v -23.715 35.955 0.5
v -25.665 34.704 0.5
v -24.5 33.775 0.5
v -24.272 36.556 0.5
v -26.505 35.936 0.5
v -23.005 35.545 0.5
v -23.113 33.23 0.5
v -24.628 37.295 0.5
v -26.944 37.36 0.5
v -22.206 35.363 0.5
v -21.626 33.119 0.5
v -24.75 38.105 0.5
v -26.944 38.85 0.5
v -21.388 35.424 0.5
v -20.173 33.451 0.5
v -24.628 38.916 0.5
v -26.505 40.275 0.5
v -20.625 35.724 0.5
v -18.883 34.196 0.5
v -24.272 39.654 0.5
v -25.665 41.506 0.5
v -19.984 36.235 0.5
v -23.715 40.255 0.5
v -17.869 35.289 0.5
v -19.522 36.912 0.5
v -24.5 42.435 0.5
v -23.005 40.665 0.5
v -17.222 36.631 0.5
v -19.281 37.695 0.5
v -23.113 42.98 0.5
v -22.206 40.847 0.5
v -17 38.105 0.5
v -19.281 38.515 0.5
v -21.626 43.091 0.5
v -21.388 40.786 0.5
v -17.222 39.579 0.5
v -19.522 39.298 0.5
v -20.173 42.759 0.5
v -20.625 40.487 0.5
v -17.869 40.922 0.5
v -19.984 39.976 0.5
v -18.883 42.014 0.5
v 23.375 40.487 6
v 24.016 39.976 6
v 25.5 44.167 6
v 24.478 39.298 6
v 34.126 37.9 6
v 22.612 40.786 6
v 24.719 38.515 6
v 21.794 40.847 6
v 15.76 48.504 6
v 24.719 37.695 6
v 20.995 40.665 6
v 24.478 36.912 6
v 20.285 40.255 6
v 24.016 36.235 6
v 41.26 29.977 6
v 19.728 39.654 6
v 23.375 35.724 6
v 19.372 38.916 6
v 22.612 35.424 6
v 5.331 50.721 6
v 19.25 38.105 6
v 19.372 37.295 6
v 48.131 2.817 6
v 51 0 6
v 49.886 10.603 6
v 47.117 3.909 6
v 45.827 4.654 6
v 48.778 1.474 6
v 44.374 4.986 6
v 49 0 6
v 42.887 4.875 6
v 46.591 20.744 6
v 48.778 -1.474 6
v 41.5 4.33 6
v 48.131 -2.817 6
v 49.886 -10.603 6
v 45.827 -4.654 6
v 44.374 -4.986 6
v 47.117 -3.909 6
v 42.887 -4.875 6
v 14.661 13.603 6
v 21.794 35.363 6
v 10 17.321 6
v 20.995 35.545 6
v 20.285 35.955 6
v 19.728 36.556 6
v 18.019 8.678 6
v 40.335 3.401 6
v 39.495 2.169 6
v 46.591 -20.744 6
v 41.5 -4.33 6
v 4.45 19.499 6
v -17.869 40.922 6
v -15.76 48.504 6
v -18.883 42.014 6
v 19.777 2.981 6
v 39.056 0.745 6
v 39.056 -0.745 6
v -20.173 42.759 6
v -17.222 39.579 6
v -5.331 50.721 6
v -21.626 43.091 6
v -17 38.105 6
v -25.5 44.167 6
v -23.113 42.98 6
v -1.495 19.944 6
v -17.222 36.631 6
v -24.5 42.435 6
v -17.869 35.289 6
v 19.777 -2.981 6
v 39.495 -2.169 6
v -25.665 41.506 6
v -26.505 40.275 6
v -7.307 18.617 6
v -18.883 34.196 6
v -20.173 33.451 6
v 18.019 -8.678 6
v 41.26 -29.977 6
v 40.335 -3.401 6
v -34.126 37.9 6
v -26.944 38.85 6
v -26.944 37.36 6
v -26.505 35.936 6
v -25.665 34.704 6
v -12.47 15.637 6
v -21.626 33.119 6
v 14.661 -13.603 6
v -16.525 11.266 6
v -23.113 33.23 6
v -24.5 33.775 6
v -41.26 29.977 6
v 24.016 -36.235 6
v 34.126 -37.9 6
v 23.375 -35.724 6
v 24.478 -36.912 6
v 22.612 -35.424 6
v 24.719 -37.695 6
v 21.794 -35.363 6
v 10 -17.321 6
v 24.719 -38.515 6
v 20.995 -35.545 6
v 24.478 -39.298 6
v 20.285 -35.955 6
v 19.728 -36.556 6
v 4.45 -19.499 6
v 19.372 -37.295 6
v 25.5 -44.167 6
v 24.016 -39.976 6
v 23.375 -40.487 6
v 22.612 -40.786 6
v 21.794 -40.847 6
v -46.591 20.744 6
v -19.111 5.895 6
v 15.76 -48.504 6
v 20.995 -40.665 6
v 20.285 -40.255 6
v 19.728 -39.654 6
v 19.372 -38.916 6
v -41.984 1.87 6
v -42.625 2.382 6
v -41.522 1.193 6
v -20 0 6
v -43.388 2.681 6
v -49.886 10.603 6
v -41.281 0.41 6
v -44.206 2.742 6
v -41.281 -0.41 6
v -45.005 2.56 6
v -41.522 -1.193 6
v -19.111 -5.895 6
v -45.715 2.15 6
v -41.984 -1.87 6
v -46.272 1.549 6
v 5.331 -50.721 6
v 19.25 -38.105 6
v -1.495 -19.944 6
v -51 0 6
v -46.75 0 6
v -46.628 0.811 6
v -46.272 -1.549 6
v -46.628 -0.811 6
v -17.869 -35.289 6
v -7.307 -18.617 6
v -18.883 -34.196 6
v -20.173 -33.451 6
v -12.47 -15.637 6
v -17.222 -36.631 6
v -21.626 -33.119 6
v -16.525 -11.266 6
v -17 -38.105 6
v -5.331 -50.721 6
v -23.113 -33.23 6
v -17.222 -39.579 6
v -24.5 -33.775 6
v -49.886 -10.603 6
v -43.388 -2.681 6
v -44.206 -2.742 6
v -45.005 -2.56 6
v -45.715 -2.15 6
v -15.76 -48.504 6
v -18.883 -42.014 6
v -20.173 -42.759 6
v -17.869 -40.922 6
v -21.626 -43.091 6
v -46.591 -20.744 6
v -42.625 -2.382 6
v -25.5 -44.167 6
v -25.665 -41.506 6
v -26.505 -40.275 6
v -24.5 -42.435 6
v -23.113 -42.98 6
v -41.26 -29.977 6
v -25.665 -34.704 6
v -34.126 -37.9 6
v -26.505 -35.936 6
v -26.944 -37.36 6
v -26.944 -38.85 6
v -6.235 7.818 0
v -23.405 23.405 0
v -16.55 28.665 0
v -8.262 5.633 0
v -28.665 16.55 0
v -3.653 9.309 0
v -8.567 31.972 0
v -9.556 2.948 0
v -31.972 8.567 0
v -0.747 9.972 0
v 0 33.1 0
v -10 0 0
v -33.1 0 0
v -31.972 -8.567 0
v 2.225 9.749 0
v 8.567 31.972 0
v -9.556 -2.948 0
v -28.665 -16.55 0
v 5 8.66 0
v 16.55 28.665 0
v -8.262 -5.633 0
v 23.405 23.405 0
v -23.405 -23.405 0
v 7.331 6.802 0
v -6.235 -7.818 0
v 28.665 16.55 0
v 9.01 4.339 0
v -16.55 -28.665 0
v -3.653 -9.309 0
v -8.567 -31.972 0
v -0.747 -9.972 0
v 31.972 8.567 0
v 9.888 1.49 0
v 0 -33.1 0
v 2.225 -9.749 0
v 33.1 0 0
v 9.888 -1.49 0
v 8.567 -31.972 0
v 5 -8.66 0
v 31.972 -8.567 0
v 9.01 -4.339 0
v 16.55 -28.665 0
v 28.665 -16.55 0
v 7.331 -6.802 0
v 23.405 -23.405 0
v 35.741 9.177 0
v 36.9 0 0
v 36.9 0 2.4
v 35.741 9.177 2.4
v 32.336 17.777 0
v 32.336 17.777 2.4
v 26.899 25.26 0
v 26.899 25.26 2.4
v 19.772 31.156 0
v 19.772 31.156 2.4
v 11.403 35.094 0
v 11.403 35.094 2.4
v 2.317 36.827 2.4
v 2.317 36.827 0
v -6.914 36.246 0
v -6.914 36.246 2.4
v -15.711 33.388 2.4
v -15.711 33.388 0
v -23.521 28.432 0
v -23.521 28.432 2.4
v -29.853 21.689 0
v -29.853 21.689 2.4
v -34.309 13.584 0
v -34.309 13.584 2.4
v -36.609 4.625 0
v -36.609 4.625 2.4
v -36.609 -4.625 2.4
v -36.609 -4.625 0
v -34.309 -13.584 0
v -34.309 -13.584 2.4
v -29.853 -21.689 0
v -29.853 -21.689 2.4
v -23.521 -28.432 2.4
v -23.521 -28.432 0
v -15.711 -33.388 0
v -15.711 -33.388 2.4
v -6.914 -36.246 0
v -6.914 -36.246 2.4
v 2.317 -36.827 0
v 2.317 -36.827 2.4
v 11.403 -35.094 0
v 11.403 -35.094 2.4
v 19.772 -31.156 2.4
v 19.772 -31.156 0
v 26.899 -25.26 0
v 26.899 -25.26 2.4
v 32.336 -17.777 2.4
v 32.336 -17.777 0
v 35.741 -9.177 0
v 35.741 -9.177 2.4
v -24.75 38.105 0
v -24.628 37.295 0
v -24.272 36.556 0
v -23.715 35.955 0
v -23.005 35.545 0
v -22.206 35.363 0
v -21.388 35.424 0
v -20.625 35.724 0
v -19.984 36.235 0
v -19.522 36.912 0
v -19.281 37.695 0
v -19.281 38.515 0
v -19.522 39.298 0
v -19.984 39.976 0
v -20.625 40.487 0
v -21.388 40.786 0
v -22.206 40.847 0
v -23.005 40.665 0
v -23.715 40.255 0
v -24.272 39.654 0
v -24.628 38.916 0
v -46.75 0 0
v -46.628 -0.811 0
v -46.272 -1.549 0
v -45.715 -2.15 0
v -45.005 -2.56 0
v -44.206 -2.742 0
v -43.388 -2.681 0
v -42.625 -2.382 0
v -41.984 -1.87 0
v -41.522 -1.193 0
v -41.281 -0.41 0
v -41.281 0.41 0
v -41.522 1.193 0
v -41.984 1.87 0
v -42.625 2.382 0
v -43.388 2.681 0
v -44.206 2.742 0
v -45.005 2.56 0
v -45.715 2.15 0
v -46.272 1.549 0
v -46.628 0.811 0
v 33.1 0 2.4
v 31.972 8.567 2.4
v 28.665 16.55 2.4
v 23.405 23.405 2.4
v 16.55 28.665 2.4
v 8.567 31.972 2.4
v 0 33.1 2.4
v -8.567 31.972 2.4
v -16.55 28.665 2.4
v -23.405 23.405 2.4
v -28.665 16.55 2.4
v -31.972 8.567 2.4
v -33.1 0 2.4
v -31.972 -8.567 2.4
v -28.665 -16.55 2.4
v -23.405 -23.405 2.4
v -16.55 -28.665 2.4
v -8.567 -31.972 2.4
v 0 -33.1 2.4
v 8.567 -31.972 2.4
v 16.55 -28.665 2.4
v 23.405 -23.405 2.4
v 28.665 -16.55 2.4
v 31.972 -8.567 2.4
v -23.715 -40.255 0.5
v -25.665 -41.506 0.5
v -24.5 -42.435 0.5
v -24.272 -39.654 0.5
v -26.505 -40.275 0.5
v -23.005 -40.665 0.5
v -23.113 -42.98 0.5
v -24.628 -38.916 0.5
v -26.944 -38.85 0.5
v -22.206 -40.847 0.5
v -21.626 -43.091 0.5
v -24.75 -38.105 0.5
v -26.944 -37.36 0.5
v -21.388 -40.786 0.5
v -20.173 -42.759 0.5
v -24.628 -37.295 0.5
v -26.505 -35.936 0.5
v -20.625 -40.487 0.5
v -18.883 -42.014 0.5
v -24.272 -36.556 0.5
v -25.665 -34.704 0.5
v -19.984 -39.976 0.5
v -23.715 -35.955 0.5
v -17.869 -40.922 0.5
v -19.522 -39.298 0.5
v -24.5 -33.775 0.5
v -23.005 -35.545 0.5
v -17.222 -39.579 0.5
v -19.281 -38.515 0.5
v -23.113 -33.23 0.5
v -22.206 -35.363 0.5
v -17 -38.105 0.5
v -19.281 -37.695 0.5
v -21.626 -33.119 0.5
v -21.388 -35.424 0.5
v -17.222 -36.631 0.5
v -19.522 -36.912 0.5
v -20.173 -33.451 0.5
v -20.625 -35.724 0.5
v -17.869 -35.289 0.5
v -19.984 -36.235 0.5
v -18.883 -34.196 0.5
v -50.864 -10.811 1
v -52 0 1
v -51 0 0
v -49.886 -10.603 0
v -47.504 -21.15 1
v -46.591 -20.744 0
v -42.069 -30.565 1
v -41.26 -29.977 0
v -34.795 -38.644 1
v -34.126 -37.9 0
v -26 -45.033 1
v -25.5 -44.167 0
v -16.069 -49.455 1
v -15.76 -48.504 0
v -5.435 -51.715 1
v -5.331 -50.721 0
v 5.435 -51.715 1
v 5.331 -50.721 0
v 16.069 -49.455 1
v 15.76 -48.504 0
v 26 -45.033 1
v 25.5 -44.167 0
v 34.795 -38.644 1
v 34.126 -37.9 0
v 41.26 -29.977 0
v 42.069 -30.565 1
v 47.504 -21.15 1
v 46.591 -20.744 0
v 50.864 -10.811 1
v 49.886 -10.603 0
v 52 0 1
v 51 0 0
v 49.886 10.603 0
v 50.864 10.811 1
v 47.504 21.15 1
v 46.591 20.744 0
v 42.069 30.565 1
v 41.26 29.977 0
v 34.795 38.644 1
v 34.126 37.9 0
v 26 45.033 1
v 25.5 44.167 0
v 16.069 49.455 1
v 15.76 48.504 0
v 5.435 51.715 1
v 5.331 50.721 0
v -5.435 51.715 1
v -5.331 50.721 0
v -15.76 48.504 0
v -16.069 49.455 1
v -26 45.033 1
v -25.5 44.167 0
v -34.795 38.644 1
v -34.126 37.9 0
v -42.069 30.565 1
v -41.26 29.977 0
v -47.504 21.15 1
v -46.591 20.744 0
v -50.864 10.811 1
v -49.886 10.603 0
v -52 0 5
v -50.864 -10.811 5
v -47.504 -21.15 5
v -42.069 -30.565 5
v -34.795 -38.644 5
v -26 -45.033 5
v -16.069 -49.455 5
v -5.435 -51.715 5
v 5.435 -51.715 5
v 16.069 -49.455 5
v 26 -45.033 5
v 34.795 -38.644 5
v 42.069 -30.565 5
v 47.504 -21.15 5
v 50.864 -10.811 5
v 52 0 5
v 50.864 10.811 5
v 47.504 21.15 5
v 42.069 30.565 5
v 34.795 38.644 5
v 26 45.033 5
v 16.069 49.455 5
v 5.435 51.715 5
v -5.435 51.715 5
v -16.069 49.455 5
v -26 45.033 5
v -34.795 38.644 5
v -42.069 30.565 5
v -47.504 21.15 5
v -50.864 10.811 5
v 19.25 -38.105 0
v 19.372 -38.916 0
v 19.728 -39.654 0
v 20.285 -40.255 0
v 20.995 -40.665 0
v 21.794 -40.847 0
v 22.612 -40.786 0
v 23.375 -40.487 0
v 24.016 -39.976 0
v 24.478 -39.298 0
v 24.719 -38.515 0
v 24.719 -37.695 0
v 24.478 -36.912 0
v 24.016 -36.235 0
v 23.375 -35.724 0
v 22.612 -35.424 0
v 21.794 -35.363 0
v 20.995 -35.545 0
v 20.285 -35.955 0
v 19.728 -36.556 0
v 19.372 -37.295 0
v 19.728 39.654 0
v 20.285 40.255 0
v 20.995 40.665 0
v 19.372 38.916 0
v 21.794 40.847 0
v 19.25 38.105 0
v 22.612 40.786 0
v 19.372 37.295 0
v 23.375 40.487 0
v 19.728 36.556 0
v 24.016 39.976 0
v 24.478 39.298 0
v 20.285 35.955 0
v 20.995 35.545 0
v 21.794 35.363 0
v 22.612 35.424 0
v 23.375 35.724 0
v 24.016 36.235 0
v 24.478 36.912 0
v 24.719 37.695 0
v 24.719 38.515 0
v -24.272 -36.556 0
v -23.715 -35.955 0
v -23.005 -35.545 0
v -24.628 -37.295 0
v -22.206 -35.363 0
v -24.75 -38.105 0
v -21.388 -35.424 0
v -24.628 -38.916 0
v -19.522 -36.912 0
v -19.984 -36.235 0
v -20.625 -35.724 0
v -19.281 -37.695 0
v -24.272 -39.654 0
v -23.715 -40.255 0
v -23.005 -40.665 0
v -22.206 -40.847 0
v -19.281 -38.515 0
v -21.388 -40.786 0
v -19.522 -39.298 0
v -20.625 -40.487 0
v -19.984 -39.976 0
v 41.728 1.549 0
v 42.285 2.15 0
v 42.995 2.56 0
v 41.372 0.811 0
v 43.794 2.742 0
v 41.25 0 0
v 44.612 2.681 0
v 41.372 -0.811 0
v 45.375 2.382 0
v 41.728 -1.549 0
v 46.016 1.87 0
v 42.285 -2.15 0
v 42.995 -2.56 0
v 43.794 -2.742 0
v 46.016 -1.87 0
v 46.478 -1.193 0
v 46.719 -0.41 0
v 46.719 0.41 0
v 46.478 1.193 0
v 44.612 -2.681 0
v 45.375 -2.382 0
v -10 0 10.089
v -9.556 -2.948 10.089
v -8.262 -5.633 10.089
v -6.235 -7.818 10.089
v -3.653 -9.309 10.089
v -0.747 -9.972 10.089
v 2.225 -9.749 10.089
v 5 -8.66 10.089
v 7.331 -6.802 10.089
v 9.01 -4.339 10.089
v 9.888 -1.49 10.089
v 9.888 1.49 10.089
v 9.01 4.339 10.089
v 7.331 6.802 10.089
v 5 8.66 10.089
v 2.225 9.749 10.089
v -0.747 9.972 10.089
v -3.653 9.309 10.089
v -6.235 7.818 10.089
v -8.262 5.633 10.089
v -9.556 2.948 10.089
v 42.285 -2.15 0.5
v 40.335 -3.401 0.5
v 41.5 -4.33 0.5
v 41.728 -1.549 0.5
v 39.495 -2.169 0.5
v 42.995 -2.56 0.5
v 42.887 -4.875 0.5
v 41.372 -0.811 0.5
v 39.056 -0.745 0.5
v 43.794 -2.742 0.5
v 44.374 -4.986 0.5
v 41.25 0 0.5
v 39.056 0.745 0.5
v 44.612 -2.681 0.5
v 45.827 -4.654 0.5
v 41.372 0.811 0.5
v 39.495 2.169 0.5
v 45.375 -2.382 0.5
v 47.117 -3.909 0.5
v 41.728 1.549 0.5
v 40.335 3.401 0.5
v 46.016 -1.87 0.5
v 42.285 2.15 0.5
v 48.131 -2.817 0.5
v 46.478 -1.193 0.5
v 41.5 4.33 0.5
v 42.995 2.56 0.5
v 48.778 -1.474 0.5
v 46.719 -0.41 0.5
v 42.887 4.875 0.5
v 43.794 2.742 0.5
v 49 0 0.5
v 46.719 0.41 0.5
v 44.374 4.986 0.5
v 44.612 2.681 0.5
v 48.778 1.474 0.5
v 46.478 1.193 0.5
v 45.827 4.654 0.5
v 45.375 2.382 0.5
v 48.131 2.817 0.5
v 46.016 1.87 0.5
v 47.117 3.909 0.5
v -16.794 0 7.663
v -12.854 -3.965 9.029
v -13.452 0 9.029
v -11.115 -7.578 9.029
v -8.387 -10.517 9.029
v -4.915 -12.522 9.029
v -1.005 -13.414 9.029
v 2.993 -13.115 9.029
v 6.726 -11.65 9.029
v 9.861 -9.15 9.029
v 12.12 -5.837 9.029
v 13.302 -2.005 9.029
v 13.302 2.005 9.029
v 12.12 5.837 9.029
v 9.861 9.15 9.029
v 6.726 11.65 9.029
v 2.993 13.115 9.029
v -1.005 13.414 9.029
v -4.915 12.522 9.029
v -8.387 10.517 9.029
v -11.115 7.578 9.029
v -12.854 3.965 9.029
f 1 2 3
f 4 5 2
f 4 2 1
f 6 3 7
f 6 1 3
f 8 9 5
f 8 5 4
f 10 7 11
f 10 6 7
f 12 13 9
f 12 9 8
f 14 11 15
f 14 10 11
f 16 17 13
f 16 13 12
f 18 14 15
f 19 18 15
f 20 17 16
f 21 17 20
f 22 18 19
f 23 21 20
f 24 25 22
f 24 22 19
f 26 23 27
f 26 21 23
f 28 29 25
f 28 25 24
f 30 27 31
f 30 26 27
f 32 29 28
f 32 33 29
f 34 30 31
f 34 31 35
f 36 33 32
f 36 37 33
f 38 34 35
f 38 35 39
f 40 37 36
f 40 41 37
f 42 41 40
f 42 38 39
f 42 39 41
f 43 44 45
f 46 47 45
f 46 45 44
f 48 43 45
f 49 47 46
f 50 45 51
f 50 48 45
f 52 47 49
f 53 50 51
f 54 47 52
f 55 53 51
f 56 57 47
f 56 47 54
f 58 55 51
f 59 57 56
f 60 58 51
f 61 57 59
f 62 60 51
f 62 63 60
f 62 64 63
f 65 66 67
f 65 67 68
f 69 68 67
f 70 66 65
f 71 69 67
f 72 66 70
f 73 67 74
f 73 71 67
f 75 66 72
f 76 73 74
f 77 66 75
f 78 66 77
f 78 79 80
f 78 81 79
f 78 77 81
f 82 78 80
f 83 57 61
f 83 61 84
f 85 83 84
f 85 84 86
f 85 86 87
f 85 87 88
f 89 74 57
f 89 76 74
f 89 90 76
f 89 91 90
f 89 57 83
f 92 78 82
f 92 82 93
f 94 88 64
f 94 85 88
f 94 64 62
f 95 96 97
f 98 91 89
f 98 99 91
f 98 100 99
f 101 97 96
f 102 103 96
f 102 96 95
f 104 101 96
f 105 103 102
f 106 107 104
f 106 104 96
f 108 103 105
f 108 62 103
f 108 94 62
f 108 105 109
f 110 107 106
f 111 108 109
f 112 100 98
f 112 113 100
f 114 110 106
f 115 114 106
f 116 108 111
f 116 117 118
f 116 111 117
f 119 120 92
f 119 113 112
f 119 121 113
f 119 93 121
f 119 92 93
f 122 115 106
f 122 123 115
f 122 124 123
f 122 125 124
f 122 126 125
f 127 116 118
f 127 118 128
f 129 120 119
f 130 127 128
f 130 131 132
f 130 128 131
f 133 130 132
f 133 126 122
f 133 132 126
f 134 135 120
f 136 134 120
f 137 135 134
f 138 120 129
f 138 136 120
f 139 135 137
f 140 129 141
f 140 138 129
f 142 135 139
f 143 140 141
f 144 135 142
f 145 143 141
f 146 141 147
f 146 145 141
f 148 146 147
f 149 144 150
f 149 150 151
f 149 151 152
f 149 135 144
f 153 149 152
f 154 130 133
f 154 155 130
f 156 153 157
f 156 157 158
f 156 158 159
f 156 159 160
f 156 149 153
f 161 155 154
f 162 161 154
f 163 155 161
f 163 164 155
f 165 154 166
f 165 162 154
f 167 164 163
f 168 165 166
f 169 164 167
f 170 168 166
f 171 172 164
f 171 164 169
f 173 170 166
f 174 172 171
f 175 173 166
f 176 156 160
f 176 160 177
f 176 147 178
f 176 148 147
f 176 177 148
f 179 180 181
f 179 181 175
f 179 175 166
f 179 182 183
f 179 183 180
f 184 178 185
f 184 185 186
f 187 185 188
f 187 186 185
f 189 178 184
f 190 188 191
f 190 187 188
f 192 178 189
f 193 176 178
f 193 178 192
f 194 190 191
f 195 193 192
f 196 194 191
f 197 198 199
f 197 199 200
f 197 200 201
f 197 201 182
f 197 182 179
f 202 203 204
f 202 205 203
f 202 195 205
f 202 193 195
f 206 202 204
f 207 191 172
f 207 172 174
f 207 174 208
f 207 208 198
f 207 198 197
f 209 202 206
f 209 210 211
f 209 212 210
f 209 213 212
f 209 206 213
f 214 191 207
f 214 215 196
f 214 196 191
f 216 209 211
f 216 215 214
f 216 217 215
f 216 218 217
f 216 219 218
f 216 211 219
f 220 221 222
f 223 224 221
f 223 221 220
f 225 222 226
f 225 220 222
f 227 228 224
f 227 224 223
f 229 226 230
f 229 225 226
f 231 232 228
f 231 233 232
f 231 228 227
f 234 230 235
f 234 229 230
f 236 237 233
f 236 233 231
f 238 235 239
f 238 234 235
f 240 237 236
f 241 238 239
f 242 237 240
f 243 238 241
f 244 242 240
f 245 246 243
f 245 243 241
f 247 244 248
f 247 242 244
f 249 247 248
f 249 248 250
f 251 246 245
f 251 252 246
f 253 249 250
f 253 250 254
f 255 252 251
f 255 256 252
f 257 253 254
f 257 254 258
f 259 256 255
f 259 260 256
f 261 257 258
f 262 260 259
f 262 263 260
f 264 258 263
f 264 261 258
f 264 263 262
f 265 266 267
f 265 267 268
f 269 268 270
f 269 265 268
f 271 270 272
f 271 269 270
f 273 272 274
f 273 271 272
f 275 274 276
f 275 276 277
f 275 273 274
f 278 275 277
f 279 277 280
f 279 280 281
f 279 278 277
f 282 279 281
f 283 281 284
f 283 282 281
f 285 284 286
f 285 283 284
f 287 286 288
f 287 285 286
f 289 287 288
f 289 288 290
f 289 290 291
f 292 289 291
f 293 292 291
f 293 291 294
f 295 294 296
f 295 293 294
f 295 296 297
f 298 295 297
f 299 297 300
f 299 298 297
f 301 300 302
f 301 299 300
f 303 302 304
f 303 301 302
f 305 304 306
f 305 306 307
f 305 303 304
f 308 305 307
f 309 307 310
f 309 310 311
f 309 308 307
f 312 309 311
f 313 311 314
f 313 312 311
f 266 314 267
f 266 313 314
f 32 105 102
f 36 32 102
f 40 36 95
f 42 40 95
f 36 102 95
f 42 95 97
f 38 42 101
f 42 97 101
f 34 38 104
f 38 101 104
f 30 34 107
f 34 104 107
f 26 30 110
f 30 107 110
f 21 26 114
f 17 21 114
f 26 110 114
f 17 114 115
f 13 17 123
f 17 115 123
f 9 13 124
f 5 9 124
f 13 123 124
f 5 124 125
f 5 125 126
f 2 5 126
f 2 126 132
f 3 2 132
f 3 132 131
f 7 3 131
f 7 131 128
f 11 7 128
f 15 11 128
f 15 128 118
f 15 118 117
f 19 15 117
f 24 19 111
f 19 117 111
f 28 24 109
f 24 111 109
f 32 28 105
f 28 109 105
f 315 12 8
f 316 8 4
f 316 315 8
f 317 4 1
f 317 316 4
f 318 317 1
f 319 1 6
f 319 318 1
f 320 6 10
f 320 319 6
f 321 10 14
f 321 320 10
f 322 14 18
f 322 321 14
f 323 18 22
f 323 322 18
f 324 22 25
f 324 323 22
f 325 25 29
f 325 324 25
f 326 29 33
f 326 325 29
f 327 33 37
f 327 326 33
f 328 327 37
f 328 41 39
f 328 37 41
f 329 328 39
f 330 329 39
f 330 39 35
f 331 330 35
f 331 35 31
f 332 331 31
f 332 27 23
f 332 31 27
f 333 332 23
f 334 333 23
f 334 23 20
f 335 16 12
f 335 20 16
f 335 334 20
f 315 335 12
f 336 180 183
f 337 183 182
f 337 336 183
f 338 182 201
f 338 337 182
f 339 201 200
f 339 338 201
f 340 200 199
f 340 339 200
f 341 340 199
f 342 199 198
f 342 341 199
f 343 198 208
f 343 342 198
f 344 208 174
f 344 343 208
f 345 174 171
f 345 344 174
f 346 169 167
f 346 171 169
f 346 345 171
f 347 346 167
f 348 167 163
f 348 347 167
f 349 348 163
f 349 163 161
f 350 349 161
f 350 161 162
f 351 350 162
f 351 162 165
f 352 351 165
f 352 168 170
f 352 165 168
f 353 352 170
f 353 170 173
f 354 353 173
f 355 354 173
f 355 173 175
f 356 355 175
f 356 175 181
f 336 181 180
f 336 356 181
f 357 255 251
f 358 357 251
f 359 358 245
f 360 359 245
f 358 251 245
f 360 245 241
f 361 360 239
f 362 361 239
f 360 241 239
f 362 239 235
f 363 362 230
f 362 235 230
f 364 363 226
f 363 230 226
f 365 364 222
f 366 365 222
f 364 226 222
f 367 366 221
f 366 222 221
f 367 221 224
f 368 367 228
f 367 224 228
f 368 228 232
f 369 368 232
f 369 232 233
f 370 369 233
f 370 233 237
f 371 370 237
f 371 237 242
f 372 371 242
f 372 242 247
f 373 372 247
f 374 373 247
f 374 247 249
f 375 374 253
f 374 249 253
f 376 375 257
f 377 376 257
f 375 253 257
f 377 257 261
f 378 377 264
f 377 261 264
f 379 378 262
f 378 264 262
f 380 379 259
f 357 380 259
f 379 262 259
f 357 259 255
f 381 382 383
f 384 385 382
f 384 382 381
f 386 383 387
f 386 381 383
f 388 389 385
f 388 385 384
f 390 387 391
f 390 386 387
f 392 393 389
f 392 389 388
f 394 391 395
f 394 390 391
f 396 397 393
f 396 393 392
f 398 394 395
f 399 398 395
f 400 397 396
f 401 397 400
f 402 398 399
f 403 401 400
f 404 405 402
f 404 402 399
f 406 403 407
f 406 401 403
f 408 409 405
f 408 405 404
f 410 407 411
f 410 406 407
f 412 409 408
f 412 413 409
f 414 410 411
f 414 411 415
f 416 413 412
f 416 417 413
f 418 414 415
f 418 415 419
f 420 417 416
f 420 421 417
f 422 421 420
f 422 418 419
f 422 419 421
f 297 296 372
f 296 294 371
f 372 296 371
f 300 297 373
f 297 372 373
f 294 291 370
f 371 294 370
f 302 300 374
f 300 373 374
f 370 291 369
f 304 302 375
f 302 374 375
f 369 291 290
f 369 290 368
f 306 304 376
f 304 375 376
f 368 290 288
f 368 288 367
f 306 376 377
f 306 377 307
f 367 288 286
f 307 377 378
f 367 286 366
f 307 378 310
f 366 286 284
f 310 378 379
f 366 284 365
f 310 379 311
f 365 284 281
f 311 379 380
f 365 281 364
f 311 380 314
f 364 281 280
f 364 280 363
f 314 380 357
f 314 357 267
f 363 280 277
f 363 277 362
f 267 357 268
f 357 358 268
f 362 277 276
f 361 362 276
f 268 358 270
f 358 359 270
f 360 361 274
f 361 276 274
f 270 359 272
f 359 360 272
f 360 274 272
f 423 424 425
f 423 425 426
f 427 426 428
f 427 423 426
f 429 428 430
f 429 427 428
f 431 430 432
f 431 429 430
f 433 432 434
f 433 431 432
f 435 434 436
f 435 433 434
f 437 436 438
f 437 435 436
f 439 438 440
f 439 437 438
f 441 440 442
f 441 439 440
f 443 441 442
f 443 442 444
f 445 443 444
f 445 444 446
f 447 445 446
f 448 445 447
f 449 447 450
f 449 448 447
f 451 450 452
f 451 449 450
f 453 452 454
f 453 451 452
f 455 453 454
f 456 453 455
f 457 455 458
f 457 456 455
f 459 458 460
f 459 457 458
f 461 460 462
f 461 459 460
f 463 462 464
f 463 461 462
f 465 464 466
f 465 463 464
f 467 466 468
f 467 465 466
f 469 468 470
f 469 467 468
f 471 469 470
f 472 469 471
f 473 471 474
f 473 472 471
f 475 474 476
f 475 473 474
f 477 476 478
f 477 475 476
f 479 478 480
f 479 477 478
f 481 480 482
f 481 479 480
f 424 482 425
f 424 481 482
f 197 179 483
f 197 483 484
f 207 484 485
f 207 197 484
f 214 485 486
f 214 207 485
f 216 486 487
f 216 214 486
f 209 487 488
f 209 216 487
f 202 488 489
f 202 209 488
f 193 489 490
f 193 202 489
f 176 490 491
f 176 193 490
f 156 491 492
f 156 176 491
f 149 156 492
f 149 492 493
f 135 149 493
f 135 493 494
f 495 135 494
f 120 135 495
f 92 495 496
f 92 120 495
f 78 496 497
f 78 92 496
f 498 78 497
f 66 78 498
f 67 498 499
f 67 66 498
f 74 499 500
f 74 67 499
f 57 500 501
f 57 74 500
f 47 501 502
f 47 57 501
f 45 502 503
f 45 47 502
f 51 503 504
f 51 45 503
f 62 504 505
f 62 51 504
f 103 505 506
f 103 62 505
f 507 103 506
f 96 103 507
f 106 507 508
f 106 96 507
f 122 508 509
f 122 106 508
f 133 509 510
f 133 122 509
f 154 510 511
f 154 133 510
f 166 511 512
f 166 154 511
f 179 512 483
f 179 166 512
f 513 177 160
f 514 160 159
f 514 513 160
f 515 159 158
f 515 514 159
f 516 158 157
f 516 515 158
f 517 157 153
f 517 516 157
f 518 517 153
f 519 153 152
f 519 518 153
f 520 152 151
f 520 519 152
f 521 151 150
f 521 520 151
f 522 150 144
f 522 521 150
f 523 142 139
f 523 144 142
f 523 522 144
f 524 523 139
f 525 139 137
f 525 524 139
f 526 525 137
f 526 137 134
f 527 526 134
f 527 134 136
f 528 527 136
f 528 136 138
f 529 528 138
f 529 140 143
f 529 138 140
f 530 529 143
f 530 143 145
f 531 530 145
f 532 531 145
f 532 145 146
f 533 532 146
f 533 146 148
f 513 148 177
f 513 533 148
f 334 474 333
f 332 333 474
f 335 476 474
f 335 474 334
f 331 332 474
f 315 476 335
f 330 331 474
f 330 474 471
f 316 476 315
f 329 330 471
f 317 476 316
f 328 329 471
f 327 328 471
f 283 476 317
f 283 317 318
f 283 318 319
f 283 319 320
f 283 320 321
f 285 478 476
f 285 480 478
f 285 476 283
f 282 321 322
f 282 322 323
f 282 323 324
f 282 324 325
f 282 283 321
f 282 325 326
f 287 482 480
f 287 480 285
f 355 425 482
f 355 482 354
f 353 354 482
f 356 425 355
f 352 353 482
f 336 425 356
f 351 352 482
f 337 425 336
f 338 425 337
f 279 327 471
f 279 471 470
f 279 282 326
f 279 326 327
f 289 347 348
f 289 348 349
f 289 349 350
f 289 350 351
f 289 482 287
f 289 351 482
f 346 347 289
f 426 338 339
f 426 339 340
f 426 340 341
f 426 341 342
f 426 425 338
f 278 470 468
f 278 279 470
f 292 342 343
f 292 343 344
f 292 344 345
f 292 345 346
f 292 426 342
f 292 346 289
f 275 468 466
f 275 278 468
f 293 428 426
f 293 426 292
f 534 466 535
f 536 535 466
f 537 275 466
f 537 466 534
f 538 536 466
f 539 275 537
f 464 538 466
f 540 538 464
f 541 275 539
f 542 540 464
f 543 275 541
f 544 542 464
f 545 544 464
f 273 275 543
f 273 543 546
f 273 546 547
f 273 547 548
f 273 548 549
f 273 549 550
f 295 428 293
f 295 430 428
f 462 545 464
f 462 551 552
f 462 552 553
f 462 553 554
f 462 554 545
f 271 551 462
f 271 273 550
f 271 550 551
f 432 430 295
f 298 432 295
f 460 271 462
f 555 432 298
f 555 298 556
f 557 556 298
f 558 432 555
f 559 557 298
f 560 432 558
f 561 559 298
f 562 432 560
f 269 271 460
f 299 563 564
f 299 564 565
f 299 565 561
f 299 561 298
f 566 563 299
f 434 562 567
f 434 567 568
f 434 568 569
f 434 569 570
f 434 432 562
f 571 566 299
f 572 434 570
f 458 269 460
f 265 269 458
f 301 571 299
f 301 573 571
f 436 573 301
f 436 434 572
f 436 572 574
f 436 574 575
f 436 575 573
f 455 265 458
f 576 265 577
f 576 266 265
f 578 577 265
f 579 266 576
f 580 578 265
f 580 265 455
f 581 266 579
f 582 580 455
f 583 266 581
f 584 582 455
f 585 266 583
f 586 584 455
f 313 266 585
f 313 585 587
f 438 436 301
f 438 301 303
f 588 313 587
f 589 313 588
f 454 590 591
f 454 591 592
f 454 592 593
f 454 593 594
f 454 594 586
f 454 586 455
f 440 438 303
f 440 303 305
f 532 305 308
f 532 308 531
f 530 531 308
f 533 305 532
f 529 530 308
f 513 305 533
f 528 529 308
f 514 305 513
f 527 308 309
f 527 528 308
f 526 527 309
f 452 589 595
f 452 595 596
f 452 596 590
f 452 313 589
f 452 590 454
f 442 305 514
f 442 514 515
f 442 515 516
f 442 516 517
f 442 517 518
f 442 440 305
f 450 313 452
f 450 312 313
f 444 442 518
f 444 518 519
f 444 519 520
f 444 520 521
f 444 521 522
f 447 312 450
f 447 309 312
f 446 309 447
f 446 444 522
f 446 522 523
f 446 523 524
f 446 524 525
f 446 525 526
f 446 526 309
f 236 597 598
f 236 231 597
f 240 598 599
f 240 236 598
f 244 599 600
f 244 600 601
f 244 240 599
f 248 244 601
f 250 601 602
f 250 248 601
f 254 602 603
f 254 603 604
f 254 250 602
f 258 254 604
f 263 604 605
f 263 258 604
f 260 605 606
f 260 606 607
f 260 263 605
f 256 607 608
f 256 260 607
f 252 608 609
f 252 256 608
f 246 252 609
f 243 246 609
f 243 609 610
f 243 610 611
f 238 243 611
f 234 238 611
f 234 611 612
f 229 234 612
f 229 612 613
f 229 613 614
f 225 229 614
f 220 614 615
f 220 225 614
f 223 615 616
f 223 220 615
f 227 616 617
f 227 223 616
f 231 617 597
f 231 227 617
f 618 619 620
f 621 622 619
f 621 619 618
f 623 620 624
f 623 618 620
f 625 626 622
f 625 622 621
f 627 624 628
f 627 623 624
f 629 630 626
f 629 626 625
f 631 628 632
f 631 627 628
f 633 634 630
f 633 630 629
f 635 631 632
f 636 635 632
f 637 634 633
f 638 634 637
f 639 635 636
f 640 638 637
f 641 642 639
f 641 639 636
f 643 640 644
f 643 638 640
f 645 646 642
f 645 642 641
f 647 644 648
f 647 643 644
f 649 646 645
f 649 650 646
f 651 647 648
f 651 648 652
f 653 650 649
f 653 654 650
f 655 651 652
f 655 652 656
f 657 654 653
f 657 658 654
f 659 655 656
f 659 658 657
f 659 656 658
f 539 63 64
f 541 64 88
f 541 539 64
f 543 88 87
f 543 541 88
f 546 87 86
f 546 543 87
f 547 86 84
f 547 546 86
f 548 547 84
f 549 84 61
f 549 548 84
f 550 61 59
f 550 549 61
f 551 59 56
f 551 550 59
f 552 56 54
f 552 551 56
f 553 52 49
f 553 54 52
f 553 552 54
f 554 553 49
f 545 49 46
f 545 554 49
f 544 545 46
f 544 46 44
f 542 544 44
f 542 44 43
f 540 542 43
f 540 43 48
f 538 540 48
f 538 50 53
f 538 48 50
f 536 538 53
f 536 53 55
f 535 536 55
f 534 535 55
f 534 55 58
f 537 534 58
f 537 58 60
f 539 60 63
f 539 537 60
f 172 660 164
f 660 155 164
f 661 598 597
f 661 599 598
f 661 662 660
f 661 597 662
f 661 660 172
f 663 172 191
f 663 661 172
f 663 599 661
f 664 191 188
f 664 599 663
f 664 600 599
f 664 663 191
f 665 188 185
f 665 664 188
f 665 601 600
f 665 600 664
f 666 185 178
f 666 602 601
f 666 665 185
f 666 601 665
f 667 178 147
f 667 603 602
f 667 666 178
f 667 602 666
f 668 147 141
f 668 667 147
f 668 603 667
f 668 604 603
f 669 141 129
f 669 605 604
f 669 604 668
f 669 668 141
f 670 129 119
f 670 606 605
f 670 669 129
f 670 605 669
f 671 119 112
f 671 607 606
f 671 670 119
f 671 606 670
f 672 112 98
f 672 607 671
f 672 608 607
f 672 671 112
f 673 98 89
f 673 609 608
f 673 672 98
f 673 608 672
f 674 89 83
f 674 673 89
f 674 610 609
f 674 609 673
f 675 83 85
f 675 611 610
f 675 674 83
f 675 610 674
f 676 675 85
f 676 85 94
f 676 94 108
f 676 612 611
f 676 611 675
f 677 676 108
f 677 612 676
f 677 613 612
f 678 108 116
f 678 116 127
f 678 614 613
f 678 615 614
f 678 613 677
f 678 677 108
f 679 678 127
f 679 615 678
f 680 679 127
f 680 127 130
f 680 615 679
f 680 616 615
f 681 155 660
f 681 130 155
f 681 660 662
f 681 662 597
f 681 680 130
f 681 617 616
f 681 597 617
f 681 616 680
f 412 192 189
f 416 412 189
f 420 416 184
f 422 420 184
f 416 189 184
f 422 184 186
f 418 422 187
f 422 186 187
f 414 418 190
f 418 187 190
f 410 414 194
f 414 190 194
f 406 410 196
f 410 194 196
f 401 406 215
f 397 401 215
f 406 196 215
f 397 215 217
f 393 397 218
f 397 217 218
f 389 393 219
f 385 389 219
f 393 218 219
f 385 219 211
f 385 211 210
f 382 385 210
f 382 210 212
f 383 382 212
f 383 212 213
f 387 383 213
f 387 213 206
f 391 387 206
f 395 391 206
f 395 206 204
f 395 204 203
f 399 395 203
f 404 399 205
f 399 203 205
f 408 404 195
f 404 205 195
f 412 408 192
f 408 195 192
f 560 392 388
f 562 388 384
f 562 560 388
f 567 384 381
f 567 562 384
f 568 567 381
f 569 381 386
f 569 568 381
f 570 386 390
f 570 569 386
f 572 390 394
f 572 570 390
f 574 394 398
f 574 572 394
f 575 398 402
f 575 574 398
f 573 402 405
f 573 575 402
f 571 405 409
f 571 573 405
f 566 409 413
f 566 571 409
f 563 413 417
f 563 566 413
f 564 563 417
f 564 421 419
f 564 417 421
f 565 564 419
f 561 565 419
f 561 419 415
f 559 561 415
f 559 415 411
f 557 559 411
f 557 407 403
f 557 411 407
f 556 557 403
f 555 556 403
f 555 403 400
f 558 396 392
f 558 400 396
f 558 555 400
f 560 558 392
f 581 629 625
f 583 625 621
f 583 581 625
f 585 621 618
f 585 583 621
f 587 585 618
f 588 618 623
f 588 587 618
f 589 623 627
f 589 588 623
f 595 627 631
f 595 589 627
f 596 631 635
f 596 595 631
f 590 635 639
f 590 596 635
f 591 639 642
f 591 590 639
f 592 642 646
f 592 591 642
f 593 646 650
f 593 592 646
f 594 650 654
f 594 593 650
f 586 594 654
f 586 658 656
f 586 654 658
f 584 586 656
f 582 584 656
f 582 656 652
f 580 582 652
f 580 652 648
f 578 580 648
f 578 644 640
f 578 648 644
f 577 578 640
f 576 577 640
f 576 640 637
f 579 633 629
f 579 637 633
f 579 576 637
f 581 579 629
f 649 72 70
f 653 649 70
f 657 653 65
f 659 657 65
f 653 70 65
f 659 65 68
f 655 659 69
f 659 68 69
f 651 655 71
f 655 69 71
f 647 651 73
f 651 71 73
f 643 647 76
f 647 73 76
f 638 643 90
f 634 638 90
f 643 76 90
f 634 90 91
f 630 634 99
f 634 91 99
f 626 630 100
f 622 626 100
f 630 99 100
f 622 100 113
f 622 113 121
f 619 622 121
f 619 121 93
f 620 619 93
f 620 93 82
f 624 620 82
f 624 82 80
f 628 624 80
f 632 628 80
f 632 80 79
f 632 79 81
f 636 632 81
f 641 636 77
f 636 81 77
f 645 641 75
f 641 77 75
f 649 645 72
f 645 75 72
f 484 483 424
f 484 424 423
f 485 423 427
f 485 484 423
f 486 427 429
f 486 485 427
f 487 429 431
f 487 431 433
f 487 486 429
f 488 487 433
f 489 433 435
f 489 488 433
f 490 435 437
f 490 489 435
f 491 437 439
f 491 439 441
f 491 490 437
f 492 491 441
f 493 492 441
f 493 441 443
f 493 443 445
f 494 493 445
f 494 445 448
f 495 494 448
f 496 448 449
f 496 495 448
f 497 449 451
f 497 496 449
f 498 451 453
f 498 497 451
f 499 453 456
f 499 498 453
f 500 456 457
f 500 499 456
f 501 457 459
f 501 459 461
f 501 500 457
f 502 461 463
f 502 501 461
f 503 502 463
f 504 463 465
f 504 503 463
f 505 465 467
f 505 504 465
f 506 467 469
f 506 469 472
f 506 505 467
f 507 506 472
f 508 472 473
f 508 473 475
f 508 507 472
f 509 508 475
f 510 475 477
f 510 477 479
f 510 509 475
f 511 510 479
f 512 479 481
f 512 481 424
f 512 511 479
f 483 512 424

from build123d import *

# Parameters (mm, degrees)
SK_H0_R            = 2.75
CUT_H0_DEPTH       = 75.227920828
SK_H1_R            = 2.75
CUT_H1_DEPTH       = 75.227920828
SK_H2_R            = 2.75
CUT_H2_DEPTH       = 75.227920828
SK_H60_R           = 2.75
CUT_H60_DEPTH      = 75.227920828
SK_H180_R          = 2.75
CUT_H180_DEPTH     = 75.227920828
SK_H300_R          = 2.75
CUT_H300_DEPTH     = 75.227920828
SK_CB0_R           = 5
CUT_CB0_DEPTH      = 3.25
SK_CB1_R           = 5
CUT_CB1_DEPTH      = 3.25
SK_CB2_R           = 5
CUT_CB2_DEPTH      = 3.25
SK_GROOVE70_R      = 36.9
SK_GROOVE70_R_2    = 33.1
CUT_GROOVE70_DEPTH = 2.4
CHAMFER_C1_SIZE    = 1


with BuildPart() as part:
    # Sk_cover → Rev_cover (revolve)
    with BuildSketch(Plane(origin=(0, 0, 0), x_dir=(1, 0, 0), z_dir=(0, 1, 0)), mode=Mode.PRIVATE) as rev_cover_sk:
        with BuildLine():
            Line((10, 0), (52, 0))
            Line((52, 0), (52, -6))
            Line((52, -6), (20, -6))
            ThreePointArc((20, -6), (15.138679109, -8.383575327), (10, -10.088817))
            Line((10, -10.088817), (10, 0))
        make_face()
    revolve(rev_cover_sk.sketch.rotate(Axis((0, 0, 0), (0, 0, 1)), 180), axis=Axis((0, 0, 0), (0, 0, 1)))

    # Sk_h0 → Cut_h0 (cut, through all)
    with BuildSketch(Plane.XY):
        with Locations(Location((44, 0, 0), (0, 0, 180))):
            Circle(SK_H0_R)
    extrude(amount=CUT_H0_DEPTH, mode=Mode.SUBTRACT)

    # Sk_h1 → Cut_h1 (cut, through all)
    with BuildSketch(Plane.XY):
        with Locations(Location((-22, 38.105117767, 0), (0, 0, 180))):
            Circle(SK_H1_R)
    extrude(amount=CUT_H1_DEPTH, mode=Mode.SUBTRACT)

    # Sk_h2 → Cut_h2 (cut, through all)
    with BuildSketch(Plane.XY):
        with Locations(Location((-22, -38.105117767, 0), (0, 0, 180))):
            Circle(SK_H2_R)
    extrude(amount=CUT_H2_DEPTH, mode=Mode.SUBTRACT)

    # Sk_h60 → Cut_h60 (cut, through all)
    with BuildSketch(Plane.XY):
        with Locations(Location((22, 38.105117767, 0), (0, 0, 180))):
            Circle(SK_H60_R)
    extrude(amount=CUT_H60_DEPTH, mode=Mode.SUBTRACT)

    # Sk_h180 → Cut_h180 (cut, through all)
    with BuildSketch(Plane.XY):
        with Locations(Location((-44, 0, 0), (0, 0, 180))):
            Circle(SK_H180_R)
    extrude(amount=CUT_H180_DEPTH, mode=Mode.SUBTRACT)

    # Sk_h300 → Cut_h300 (cut, through all)
    with BuildSketch(Plane.XY):
        with Locations(Location((22, -38.105117767, 0), (0, 0, 180))):
            Circle(SK_H300_R)
    extrude(amount=CUT_H300_DEPTH, mode=Mode.SUBTRACT)

    # Sk_cb0 → Cut_cb0 (cut, symmetric)
    with BuildSketch(Plane.XY.offset(3.75)):
        with Locations((44, 0)):
            Circle(SK_CB0_R)
    extrude(amount=CUT_CB0_DEPTH, both=True, mode=Mode.SUBTRACT)

    # Sk_cb1 → Cut_cb1 (cut, symmetric)
    with BuildSketch(Plane.XY.offset(3.75)):
        with Locations((-22, 38.105117767)):
            Circle(SK_CB1_R)
    extrude(amount=CUT_CB1_DEPTH, both=True, mode=Mode.SUBTRACT)

    # Sk_cb2 → Cut_cb2 (cut, symmetric)
    with BuildSketch(Plane.XY.offset(3.75)):
        with Locations((-22, -38.105117767)):
            Circle(SK_CB2_R)
    extrude(amount=CUT_CB2_DEPTH, both=True, mode=Mode.SUBTRACT)

    # Sk_groove70 → Cut_groove70 (cut)
    with BuildSketch(Plane.XY):
        Circle(SK_GROOVE70_R)
        Circle(SK_GROOVE70_R_2, mode=Mode.SUBTRACT)
    extrude(amount=CUT_GROOVE70_DEPTH, mode=Mode.SUBTRACT)

    # Chamfer_C1
    chamfer_c1_edges = [part.edges().sort_by_distance(p)[0] for p in [
        (52, 0, 6),
        (52, 0, 0),
    ]]
    chamfer(chamfer_c1_edges, length=CHAMFER_C1_SIZE)


solid = part.part
